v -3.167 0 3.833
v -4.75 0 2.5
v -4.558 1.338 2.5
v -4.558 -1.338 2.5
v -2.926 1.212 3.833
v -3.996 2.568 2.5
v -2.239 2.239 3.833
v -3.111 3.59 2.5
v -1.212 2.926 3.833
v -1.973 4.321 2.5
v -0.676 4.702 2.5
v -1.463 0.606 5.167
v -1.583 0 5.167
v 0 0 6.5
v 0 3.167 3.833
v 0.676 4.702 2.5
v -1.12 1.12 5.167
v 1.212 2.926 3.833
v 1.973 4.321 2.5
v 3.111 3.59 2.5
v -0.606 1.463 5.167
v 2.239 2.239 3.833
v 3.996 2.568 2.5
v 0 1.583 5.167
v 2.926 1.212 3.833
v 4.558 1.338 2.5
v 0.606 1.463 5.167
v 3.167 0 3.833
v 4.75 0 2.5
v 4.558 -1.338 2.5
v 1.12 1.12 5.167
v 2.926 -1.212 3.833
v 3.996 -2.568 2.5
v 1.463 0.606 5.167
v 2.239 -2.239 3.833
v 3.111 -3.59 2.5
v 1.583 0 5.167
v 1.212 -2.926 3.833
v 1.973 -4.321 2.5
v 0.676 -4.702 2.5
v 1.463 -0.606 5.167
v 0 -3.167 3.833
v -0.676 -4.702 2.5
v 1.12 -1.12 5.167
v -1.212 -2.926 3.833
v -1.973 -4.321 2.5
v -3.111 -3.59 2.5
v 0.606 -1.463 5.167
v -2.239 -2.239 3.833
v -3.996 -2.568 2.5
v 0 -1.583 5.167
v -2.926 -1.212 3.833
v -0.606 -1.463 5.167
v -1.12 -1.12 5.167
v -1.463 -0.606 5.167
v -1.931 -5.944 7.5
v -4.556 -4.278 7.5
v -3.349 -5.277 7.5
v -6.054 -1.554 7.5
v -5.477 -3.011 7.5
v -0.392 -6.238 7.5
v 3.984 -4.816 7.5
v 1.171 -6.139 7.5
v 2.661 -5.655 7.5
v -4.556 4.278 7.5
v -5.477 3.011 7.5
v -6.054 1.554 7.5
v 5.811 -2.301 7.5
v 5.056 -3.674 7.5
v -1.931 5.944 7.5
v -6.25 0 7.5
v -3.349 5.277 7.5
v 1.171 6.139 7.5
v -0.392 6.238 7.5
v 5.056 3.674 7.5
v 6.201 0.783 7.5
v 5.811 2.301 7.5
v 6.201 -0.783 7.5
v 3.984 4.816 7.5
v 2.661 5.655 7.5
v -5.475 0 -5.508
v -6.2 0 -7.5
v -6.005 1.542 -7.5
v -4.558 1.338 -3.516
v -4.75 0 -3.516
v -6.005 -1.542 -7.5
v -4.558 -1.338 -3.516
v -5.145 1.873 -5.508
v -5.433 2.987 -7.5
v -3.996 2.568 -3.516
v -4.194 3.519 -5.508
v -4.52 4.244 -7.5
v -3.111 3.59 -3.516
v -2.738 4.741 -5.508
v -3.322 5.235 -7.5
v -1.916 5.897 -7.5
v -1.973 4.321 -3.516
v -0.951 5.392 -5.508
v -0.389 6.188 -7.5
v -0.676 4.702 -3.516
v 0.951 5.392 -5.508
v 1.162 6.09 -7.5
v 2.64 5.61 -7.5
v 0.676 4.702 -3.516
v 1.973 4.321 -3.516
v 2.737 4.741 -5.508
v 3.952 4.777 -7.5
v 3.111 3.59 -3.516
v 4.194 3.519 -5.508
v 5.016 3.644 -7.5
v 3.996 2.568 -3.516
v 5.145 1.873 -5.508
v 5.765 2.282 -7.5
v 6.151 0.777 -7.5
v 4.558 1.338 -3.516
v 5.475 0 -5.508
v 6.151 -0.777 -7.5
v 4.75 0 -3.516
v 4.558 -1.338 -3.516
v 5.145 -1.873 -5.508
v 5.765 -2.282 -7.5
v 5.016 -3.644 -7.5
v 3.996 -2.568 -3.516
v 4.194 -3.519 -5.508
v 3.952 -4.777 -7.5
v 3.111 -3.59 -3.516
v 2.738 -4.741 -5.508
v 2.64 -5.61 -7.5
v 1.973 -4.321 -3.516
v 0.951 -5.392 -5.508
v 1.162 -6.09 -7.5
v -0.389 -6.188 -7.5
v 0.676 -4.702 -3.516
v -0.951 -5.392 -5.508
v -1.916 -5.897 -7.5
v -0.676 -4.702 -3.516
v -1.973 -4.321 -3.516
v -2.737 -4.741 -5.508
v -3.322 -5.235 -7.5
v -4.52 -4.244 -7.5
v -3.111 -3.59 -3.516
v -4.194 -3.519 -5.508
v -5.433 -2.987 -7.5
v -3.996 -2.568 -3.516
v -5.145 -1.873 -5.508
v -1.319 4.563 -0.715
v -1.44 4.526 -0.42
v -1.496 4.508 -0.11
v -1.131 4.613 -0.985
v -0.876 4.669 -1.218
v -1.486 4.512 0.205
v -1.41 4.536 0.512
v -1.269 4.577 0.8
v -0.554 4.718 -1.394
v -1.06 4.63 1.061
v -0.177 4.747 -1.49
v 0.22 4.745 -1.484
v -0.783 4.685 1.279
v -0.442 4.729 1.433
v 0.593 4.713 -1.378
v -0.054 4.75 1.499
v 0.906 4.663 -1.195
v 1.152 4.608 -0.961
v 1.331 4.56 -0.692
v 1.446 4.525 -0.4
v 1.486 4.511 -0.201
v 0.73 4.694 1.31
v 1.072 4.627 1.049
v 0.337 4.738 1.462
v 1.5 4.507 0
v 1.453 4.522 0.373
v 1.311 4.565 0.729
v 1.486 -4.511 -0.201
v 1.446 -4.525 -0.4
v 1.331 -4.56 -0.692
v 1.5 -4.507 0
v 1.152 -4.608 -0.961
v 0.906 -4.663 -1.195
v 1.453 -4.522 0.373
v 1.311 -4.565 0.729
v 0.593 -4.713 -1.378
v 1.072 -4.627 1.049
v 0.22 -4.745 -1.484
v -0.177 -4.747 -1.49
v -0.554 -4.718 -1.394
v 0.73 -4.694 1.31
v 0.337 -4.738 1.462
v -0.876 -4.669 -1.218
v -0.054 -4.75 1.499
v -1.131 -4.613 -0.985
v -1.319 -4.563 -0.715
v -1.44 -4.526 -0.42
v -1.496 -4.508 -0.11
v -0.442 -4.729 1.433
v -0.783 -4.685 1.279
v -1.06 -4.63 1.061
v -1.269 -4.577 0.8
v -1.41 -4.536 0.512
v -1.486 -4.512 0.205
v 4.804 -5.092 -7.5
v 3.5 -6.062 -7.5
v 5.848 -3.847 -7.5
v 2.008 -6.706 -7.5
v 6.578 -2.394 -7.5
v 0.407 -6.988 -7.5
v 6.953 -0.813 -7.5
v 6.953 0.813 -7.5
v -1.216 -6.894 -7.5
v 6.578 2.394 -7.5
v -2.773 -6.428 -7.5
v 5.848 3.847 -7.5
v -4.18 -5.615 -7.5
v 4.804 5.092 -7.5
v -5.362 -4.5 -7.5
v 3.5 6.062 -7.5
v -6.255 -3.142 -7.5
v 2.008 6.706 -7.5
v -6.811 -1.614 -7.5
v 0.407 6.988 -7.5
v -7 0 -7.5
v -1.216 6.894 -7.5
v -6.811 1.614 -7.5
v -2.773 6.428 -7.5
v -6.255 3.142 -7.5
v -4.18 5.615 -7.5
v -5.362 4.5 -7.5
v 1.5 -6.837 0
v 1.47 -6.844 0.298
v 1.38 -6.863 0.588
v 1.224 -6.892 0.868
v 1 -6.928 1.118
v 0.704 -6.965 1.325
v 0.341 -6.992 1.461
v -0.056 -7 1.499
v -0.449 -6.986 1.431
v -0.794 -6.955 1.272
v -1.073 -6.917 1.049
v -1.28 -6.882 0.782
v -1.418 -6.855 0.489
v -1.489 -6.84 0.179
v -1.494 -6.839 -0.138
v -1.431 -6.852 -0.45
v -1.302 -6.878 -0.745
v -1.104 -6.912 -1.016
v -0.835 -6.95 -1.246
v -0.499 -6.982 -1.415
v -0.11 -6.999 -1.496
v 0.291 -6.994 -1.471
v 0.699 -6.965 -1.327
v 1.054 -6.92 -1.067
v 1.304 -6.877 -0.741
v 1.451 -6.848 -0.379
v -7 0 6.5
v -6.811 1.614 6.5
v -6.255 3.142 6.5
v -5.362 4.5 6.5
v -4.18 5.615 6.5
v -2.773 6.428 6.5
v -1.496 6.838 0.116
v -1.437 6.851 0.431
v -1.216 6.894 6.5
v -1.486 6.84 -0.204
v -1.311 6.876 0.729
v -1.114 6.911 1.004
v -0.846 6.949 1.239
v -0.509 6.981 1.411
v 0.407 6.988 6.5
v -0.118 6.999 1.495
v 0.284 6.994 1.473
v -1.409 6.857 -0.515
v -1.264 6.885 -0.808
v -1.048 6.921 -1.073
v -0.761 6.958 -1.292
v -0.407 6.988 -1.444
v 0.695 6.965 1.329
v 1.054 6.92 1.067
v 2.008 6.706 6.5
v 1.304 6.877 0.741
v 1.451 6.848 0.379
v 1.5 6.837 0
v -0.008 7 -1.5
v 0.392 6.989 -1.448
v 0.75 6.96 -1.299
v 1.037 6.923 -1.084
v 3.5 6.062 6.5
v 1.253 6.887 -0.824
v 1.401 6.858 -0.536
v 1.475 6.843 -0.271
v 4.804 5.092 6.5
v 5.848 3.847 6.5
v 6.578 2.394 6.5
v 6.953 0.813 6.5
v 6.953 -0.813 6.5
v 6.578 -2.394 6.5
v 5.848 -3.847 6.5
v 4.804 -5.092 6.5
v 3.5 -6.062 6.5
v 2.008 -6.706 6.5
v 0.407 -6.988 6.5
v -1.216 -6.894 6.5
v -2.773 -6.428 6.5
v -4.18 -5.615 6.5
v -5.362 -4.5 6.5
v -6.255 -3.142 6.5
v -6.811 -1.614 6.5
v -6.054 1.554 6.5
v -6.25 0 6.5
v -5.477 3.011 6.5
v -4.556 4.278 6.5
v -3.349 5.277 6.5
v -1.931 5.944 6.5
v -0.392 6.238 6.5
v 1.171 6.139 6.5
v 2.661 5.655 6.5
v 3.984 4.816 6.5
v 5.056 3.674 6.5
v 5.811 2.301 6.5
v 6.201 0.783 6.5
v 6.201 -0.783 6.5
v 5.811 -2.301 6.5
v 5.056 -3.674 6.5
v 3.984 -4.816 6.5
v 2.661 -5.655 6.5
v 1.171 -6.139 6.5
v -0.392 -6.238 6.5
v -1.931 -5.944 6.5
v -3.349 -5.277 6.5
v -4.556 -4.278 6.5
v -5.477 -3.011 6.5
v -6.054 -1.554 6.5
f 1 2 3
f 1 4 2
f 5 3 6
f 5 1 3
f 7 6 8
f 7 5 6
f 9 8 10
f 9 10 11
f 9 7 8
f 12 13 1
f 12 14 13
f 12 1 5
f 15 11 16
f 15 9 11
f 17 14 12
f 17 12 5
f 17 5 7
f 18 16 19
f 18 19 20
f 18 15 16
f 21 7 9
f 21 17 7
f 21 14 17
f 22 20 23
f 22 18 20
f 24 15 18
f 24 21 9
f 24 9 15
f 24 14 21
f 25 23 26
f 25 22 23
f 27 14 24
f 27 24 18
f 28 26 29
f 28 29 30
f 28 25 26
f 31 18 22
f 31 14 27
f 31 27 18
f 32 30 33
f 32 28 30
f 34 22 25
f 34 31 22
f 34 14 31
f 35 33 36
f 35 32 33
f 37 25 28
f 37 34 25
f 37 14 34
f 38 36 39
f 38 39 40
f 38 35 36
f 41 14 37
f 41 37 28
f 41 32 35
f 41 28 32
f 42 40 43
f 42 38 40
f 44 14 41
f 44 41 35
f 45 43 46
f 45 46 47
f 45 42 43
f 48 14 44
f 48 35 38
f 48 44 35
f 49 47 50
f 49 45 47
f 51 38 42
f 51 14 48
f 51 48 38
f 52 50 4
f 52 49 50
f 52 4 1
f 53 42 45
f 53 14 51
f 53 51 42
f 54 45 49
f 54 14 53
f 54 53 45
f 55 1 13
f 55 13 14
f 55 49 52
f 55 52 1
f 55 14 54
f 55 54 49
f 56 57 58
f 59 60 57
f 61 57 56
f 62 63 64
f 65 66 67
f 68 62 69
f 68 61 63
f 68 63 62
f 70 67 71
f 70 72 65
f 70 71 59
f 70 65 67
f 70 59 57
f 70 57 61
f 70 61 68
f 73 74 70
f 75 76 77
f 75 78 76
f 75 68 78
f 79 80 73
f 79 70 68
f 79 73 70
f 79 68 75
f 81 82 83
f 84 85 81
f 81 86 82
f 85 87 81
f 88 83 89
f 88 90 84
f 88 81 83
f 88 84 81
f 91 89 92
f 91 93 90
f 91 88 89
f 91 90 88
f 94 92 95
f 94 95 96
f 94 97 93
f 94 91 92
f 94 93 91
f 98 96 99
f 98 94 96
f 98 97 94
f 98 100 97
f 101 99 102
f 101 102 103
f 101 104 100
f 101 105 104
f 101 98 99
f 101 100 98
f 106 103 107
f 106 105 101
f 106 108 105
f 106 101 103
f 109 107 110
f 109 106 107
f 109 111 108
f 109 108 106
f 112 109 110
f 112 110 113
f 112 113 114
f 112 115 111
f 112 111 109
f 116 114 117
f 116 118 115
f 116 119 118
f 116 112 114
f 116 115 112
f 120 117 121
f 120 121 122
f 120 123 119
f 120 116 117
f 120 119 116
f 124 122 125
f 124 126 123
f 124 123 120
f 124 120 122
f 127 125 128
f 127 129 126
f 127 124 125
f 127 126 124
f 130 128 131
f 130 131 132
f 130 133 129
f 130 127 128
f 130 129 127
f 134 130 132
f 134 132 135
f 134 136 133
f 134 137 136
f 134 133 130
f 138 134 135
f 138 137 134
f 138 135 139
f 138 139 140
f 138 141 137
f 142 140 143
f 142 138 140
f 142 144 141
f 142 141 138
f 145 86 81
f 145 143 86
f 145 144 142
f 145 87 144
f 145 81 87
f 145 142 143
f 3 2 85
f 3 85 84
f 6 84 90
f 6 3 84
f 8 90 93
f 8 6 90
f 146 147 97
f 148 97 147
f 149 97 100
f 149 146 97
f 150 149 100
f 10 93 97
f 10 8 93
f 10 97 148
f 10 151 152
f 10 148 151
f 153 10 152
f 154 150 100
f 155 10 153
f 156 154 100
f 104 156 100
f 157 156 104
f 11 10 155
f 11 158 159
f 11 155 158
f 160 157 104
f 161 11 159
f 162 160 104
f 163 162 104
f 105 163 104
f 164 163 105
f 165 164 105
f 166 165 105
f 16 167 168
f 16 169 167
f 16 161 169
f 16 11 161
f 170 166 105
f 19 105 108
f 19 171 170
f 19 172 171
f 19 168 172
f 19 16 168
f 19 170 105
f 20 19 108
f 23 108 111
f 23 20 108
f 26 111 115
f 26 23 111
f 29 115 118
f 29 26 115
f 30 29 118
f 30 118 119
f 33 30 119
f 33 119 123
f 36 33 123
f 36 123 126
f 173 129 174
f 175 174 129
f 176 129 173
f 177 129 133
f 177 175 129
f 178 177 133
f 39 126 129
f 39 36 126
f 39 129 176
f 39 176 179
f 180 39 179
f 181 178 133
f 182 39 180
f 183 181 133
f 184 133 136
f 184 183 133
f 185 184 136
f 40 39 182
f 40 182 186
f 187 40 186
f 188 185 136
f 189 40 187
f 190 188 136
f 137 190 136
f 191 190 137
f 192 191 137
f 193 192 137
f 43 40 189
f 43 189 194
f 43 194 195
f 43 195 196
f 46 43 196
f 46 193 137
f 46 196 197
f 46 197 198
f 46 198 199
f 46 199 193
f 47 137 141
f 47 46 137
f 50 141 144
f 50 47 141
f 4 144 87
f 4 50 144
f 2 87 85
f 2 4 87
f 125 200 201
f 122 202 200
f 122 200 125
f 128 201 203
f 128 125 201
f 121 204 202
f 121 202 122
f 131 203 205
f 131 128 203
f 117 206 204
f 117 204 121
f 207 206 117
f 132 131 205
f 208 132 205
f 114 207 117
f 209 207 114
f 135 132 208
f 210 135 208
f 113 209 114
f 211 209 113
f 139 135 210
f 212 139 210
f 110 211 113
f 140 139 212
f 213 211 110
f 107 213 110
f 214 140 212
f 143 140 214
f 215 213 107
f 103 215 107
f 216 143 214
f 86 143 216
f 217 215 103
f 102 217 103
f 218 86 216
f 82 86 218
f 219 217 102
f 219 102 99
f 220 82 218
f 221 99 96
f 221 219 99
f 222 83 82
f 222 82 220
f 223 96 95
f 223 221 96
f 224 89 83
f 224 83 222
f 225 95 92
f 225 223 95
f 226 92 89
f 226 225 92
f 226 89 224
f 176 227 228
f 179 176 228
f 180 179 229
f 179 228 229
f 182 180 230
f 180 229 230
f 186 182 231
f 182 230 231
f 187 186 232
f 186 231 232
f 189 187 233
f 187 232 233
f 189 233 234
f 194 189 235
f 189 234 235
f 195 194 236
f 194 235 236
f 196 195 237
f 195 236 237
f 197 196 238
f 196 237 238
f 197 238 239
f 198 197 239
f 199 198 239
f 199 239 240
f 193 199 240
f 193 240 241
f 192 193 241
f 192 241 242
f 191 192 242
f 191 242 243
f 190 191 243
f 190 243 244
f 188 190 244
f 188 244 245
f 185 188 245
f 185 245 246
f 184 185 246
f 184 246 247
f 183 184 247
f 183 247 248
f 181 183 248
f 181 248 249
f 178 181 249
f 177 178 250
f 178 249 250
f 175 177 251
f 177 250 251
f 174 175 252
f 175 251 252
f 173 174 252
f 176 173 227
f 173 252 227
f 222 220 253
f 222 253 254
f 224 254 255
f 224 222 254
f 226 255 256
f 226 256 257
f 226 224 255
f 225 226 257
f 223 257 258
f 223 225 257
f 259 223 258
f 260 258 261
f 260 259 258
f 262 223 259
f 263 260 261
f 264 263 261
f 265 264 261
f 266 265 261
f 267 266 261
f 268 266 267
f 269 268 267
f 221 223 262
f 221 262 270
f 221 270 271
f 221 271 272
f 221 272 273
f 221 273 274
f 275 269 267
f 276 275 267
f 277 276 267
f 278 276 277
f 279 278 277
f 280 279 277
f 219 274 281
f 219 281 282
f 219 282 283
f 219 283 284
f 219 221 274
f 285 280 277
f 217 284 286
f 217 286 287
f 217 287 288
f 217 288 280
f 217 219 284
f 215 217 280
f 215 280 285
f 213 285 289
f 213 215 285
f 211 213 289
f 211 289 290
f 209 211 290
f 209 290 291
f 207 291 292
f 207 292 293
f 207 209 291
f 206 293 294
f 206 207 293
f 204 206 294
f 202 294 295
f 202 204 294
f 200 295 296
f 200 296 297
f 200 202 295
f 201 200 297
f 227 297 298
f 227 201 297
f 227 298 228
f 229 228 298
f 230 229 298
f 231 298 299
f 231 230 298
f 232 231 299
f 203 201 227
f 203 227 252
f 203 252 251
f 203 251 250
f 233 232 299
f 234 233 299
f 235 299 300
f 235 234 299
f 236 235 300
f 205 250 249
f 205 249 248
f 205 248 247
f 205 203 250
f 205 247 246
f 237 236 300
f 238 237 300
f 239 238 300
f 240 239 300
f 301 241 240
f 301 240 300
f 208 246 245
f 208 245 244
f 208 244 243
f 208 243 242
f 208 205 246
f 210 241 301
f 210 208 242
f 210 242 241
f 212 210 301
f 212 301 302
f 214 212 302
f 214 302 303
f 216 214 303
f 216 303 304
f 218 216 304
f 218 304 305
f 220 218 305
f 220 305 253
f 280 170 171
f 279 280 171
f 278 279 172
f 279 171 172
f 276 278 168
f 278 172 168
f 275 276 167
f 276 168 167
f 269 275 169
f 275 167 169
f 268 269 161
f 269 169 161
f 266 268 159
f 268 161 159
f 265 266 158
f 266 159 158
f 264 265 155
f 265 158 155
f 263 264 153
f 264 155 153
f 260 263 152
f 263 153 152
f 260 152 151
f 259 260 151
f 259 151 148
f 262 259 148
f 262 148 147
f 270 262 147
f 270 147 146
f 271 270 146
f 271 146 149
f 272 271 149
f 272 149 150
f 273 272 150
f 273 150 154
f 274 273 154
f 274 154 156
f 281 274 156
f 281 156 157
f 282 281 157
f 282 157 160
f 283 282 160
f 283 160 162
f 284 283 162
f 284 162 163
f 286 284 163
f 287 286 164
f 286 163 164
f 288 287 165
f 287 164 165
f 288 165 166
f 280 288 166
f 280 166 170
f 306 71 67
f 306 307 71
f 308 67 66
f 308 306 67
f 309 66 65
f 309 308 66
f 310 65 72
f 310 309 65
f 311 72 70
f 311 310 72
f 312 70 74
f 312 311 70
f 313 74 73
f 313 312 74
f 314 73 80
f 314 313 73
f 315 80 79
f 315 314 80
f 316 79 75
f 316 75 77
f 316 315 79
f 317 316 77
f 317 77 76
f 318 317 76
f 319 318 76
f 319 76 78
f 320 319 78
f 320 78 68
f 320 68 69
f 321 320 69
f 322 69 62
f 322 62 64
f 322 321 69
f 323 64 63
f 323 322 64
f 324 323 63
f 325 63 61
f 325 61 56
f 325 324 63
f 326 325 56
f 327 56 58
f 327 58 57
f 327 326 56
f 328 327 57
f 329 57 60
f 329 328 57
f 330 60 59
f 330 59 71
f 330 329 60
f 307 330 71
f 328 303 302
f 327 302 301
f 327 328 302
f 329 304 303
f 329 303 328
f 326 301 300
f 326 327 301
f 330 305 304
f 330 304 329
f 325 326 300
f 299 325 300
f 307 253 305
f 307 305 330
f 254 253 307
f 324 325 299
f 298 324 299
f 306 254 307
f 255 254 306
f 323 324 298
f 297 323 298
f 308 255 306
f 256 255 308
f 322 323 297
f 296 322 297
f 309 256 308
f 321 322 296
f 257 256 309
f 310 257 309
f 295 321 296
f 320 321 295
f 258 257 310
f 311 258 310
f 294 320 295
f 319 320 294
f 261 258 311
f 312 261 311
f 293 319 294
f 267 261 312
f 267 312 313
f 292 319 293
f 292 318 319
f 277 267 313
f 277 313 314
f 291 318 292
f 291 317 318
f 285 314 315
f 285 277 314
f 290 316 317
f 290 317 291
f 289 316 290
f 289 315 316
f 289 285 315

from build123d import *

# Parameters (mm, degrees)
F3_R     = 1.5
F4_DEPTH = 14.001


with BuildPart() as f1:
    # F0 (on Front) → F1 (revolve)
    with BuildSketch(Plane.XZ):
        Polygon((-7, 6.5), (-7, -7.5), (-6.2, -7.5), (-4.75, -3.516158), (-4.75, 2.5), (0, 6.5), (0, 7.5), (-6.25, 7.5), (-6.25, 6.5), align=None)
    revolve(axis=Axis((0, 0, 0.727193), (0, 0, -1)))

    # F3 (on offset) → F4 (cut, through all)
    with BuildSketch(Plane.XZ.offset(7)):
        Circle(F3_R)
    extrude(amount=-F4_DEPTH, mode=Mode.SUBTRACT)


solid = f1.part
